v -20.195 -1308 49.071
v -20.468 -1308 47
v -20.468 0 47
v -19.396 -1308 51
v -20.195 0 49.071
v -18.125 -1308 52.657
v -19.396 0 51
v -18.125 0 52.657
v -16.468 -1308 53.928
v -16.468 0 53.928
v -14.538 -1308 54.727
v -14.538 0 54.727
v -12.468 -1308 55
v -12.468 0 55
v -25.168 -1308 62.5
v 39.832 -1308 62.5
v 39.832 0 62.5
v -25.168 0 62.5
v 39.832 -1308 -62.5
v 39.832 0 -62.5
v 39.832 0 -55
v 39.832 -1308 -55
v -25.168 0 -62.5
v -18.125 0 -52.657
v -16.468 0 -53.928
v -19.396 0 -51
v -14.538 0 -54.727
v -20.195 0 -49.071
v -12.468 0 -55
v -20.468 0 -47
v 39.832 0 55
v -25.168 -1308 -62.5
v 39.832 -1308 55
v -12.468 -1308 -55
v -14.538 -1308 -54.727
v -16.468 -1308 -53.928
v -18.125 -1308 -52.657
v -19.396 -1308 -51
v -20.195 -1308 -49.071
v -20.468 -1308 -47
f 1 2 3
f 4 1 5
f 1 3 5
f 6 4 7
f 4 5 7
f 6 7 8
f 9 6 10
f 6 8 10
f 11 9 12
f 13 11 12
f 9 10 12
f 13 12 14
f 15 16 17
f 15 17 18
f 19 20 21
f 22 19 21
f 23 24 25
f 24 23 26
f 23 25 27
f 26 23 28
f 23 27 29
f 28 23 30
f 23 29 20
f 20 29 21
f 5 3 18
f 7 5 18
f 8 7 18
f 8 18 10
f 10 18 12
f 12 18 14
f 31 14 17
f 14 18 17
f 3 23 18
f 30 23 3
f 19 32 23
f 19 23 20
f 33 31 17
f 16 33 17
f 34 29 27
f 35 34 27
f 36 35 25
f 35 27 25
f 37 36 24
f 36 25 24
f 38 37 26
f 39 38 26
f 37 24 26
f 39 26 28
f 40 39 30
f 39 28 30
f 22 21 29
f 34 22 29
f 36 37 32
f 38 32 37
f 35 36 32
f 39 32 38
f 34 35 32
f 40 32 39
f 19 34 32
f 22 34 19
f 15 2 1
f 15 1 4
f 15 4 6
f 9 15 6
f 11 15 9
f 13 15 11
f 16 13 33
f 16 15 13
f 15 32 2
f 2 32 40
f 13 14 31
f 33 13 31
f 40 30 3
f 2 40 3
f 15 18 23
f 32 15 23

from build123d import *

# Parameters (mm, degrees)
F1_DEPTH = 1308


with BuildPart() as f1:
    # F0 (on Front) → F1 (new body)
    with BuildSketch(Plane.XZ):
        with BuildLine():
            Line((-25.16784, 62.5), (-25.16784, -62.5))
            Line((-25.16784, -62.5), (39.83216, -62.5))
            Line((39.83216, -62.5), (39.83216, -55))
            Line((39.83216, -55), (-12.46784, -55))
            ThreePointArc((-12.46784, -55), (-18.124695, -52.656854), (-20.46784, -47))
            Line((-20.46784, -47), (-20.46784, 47))
            ThreePointArc((-20.46784, 47), (-18.124695, 52.656854), (-12.46784, 55))
            Line((-12.46784, 55), (39.83216, 55))
            Line((39.83216, 55), (39.83216, 62.5))
            Line((39.83216, 62.5), (-25.16784, 62.5))
        make_face()
    extrude(amount=F1_DEPTH)


solid = f1.part
